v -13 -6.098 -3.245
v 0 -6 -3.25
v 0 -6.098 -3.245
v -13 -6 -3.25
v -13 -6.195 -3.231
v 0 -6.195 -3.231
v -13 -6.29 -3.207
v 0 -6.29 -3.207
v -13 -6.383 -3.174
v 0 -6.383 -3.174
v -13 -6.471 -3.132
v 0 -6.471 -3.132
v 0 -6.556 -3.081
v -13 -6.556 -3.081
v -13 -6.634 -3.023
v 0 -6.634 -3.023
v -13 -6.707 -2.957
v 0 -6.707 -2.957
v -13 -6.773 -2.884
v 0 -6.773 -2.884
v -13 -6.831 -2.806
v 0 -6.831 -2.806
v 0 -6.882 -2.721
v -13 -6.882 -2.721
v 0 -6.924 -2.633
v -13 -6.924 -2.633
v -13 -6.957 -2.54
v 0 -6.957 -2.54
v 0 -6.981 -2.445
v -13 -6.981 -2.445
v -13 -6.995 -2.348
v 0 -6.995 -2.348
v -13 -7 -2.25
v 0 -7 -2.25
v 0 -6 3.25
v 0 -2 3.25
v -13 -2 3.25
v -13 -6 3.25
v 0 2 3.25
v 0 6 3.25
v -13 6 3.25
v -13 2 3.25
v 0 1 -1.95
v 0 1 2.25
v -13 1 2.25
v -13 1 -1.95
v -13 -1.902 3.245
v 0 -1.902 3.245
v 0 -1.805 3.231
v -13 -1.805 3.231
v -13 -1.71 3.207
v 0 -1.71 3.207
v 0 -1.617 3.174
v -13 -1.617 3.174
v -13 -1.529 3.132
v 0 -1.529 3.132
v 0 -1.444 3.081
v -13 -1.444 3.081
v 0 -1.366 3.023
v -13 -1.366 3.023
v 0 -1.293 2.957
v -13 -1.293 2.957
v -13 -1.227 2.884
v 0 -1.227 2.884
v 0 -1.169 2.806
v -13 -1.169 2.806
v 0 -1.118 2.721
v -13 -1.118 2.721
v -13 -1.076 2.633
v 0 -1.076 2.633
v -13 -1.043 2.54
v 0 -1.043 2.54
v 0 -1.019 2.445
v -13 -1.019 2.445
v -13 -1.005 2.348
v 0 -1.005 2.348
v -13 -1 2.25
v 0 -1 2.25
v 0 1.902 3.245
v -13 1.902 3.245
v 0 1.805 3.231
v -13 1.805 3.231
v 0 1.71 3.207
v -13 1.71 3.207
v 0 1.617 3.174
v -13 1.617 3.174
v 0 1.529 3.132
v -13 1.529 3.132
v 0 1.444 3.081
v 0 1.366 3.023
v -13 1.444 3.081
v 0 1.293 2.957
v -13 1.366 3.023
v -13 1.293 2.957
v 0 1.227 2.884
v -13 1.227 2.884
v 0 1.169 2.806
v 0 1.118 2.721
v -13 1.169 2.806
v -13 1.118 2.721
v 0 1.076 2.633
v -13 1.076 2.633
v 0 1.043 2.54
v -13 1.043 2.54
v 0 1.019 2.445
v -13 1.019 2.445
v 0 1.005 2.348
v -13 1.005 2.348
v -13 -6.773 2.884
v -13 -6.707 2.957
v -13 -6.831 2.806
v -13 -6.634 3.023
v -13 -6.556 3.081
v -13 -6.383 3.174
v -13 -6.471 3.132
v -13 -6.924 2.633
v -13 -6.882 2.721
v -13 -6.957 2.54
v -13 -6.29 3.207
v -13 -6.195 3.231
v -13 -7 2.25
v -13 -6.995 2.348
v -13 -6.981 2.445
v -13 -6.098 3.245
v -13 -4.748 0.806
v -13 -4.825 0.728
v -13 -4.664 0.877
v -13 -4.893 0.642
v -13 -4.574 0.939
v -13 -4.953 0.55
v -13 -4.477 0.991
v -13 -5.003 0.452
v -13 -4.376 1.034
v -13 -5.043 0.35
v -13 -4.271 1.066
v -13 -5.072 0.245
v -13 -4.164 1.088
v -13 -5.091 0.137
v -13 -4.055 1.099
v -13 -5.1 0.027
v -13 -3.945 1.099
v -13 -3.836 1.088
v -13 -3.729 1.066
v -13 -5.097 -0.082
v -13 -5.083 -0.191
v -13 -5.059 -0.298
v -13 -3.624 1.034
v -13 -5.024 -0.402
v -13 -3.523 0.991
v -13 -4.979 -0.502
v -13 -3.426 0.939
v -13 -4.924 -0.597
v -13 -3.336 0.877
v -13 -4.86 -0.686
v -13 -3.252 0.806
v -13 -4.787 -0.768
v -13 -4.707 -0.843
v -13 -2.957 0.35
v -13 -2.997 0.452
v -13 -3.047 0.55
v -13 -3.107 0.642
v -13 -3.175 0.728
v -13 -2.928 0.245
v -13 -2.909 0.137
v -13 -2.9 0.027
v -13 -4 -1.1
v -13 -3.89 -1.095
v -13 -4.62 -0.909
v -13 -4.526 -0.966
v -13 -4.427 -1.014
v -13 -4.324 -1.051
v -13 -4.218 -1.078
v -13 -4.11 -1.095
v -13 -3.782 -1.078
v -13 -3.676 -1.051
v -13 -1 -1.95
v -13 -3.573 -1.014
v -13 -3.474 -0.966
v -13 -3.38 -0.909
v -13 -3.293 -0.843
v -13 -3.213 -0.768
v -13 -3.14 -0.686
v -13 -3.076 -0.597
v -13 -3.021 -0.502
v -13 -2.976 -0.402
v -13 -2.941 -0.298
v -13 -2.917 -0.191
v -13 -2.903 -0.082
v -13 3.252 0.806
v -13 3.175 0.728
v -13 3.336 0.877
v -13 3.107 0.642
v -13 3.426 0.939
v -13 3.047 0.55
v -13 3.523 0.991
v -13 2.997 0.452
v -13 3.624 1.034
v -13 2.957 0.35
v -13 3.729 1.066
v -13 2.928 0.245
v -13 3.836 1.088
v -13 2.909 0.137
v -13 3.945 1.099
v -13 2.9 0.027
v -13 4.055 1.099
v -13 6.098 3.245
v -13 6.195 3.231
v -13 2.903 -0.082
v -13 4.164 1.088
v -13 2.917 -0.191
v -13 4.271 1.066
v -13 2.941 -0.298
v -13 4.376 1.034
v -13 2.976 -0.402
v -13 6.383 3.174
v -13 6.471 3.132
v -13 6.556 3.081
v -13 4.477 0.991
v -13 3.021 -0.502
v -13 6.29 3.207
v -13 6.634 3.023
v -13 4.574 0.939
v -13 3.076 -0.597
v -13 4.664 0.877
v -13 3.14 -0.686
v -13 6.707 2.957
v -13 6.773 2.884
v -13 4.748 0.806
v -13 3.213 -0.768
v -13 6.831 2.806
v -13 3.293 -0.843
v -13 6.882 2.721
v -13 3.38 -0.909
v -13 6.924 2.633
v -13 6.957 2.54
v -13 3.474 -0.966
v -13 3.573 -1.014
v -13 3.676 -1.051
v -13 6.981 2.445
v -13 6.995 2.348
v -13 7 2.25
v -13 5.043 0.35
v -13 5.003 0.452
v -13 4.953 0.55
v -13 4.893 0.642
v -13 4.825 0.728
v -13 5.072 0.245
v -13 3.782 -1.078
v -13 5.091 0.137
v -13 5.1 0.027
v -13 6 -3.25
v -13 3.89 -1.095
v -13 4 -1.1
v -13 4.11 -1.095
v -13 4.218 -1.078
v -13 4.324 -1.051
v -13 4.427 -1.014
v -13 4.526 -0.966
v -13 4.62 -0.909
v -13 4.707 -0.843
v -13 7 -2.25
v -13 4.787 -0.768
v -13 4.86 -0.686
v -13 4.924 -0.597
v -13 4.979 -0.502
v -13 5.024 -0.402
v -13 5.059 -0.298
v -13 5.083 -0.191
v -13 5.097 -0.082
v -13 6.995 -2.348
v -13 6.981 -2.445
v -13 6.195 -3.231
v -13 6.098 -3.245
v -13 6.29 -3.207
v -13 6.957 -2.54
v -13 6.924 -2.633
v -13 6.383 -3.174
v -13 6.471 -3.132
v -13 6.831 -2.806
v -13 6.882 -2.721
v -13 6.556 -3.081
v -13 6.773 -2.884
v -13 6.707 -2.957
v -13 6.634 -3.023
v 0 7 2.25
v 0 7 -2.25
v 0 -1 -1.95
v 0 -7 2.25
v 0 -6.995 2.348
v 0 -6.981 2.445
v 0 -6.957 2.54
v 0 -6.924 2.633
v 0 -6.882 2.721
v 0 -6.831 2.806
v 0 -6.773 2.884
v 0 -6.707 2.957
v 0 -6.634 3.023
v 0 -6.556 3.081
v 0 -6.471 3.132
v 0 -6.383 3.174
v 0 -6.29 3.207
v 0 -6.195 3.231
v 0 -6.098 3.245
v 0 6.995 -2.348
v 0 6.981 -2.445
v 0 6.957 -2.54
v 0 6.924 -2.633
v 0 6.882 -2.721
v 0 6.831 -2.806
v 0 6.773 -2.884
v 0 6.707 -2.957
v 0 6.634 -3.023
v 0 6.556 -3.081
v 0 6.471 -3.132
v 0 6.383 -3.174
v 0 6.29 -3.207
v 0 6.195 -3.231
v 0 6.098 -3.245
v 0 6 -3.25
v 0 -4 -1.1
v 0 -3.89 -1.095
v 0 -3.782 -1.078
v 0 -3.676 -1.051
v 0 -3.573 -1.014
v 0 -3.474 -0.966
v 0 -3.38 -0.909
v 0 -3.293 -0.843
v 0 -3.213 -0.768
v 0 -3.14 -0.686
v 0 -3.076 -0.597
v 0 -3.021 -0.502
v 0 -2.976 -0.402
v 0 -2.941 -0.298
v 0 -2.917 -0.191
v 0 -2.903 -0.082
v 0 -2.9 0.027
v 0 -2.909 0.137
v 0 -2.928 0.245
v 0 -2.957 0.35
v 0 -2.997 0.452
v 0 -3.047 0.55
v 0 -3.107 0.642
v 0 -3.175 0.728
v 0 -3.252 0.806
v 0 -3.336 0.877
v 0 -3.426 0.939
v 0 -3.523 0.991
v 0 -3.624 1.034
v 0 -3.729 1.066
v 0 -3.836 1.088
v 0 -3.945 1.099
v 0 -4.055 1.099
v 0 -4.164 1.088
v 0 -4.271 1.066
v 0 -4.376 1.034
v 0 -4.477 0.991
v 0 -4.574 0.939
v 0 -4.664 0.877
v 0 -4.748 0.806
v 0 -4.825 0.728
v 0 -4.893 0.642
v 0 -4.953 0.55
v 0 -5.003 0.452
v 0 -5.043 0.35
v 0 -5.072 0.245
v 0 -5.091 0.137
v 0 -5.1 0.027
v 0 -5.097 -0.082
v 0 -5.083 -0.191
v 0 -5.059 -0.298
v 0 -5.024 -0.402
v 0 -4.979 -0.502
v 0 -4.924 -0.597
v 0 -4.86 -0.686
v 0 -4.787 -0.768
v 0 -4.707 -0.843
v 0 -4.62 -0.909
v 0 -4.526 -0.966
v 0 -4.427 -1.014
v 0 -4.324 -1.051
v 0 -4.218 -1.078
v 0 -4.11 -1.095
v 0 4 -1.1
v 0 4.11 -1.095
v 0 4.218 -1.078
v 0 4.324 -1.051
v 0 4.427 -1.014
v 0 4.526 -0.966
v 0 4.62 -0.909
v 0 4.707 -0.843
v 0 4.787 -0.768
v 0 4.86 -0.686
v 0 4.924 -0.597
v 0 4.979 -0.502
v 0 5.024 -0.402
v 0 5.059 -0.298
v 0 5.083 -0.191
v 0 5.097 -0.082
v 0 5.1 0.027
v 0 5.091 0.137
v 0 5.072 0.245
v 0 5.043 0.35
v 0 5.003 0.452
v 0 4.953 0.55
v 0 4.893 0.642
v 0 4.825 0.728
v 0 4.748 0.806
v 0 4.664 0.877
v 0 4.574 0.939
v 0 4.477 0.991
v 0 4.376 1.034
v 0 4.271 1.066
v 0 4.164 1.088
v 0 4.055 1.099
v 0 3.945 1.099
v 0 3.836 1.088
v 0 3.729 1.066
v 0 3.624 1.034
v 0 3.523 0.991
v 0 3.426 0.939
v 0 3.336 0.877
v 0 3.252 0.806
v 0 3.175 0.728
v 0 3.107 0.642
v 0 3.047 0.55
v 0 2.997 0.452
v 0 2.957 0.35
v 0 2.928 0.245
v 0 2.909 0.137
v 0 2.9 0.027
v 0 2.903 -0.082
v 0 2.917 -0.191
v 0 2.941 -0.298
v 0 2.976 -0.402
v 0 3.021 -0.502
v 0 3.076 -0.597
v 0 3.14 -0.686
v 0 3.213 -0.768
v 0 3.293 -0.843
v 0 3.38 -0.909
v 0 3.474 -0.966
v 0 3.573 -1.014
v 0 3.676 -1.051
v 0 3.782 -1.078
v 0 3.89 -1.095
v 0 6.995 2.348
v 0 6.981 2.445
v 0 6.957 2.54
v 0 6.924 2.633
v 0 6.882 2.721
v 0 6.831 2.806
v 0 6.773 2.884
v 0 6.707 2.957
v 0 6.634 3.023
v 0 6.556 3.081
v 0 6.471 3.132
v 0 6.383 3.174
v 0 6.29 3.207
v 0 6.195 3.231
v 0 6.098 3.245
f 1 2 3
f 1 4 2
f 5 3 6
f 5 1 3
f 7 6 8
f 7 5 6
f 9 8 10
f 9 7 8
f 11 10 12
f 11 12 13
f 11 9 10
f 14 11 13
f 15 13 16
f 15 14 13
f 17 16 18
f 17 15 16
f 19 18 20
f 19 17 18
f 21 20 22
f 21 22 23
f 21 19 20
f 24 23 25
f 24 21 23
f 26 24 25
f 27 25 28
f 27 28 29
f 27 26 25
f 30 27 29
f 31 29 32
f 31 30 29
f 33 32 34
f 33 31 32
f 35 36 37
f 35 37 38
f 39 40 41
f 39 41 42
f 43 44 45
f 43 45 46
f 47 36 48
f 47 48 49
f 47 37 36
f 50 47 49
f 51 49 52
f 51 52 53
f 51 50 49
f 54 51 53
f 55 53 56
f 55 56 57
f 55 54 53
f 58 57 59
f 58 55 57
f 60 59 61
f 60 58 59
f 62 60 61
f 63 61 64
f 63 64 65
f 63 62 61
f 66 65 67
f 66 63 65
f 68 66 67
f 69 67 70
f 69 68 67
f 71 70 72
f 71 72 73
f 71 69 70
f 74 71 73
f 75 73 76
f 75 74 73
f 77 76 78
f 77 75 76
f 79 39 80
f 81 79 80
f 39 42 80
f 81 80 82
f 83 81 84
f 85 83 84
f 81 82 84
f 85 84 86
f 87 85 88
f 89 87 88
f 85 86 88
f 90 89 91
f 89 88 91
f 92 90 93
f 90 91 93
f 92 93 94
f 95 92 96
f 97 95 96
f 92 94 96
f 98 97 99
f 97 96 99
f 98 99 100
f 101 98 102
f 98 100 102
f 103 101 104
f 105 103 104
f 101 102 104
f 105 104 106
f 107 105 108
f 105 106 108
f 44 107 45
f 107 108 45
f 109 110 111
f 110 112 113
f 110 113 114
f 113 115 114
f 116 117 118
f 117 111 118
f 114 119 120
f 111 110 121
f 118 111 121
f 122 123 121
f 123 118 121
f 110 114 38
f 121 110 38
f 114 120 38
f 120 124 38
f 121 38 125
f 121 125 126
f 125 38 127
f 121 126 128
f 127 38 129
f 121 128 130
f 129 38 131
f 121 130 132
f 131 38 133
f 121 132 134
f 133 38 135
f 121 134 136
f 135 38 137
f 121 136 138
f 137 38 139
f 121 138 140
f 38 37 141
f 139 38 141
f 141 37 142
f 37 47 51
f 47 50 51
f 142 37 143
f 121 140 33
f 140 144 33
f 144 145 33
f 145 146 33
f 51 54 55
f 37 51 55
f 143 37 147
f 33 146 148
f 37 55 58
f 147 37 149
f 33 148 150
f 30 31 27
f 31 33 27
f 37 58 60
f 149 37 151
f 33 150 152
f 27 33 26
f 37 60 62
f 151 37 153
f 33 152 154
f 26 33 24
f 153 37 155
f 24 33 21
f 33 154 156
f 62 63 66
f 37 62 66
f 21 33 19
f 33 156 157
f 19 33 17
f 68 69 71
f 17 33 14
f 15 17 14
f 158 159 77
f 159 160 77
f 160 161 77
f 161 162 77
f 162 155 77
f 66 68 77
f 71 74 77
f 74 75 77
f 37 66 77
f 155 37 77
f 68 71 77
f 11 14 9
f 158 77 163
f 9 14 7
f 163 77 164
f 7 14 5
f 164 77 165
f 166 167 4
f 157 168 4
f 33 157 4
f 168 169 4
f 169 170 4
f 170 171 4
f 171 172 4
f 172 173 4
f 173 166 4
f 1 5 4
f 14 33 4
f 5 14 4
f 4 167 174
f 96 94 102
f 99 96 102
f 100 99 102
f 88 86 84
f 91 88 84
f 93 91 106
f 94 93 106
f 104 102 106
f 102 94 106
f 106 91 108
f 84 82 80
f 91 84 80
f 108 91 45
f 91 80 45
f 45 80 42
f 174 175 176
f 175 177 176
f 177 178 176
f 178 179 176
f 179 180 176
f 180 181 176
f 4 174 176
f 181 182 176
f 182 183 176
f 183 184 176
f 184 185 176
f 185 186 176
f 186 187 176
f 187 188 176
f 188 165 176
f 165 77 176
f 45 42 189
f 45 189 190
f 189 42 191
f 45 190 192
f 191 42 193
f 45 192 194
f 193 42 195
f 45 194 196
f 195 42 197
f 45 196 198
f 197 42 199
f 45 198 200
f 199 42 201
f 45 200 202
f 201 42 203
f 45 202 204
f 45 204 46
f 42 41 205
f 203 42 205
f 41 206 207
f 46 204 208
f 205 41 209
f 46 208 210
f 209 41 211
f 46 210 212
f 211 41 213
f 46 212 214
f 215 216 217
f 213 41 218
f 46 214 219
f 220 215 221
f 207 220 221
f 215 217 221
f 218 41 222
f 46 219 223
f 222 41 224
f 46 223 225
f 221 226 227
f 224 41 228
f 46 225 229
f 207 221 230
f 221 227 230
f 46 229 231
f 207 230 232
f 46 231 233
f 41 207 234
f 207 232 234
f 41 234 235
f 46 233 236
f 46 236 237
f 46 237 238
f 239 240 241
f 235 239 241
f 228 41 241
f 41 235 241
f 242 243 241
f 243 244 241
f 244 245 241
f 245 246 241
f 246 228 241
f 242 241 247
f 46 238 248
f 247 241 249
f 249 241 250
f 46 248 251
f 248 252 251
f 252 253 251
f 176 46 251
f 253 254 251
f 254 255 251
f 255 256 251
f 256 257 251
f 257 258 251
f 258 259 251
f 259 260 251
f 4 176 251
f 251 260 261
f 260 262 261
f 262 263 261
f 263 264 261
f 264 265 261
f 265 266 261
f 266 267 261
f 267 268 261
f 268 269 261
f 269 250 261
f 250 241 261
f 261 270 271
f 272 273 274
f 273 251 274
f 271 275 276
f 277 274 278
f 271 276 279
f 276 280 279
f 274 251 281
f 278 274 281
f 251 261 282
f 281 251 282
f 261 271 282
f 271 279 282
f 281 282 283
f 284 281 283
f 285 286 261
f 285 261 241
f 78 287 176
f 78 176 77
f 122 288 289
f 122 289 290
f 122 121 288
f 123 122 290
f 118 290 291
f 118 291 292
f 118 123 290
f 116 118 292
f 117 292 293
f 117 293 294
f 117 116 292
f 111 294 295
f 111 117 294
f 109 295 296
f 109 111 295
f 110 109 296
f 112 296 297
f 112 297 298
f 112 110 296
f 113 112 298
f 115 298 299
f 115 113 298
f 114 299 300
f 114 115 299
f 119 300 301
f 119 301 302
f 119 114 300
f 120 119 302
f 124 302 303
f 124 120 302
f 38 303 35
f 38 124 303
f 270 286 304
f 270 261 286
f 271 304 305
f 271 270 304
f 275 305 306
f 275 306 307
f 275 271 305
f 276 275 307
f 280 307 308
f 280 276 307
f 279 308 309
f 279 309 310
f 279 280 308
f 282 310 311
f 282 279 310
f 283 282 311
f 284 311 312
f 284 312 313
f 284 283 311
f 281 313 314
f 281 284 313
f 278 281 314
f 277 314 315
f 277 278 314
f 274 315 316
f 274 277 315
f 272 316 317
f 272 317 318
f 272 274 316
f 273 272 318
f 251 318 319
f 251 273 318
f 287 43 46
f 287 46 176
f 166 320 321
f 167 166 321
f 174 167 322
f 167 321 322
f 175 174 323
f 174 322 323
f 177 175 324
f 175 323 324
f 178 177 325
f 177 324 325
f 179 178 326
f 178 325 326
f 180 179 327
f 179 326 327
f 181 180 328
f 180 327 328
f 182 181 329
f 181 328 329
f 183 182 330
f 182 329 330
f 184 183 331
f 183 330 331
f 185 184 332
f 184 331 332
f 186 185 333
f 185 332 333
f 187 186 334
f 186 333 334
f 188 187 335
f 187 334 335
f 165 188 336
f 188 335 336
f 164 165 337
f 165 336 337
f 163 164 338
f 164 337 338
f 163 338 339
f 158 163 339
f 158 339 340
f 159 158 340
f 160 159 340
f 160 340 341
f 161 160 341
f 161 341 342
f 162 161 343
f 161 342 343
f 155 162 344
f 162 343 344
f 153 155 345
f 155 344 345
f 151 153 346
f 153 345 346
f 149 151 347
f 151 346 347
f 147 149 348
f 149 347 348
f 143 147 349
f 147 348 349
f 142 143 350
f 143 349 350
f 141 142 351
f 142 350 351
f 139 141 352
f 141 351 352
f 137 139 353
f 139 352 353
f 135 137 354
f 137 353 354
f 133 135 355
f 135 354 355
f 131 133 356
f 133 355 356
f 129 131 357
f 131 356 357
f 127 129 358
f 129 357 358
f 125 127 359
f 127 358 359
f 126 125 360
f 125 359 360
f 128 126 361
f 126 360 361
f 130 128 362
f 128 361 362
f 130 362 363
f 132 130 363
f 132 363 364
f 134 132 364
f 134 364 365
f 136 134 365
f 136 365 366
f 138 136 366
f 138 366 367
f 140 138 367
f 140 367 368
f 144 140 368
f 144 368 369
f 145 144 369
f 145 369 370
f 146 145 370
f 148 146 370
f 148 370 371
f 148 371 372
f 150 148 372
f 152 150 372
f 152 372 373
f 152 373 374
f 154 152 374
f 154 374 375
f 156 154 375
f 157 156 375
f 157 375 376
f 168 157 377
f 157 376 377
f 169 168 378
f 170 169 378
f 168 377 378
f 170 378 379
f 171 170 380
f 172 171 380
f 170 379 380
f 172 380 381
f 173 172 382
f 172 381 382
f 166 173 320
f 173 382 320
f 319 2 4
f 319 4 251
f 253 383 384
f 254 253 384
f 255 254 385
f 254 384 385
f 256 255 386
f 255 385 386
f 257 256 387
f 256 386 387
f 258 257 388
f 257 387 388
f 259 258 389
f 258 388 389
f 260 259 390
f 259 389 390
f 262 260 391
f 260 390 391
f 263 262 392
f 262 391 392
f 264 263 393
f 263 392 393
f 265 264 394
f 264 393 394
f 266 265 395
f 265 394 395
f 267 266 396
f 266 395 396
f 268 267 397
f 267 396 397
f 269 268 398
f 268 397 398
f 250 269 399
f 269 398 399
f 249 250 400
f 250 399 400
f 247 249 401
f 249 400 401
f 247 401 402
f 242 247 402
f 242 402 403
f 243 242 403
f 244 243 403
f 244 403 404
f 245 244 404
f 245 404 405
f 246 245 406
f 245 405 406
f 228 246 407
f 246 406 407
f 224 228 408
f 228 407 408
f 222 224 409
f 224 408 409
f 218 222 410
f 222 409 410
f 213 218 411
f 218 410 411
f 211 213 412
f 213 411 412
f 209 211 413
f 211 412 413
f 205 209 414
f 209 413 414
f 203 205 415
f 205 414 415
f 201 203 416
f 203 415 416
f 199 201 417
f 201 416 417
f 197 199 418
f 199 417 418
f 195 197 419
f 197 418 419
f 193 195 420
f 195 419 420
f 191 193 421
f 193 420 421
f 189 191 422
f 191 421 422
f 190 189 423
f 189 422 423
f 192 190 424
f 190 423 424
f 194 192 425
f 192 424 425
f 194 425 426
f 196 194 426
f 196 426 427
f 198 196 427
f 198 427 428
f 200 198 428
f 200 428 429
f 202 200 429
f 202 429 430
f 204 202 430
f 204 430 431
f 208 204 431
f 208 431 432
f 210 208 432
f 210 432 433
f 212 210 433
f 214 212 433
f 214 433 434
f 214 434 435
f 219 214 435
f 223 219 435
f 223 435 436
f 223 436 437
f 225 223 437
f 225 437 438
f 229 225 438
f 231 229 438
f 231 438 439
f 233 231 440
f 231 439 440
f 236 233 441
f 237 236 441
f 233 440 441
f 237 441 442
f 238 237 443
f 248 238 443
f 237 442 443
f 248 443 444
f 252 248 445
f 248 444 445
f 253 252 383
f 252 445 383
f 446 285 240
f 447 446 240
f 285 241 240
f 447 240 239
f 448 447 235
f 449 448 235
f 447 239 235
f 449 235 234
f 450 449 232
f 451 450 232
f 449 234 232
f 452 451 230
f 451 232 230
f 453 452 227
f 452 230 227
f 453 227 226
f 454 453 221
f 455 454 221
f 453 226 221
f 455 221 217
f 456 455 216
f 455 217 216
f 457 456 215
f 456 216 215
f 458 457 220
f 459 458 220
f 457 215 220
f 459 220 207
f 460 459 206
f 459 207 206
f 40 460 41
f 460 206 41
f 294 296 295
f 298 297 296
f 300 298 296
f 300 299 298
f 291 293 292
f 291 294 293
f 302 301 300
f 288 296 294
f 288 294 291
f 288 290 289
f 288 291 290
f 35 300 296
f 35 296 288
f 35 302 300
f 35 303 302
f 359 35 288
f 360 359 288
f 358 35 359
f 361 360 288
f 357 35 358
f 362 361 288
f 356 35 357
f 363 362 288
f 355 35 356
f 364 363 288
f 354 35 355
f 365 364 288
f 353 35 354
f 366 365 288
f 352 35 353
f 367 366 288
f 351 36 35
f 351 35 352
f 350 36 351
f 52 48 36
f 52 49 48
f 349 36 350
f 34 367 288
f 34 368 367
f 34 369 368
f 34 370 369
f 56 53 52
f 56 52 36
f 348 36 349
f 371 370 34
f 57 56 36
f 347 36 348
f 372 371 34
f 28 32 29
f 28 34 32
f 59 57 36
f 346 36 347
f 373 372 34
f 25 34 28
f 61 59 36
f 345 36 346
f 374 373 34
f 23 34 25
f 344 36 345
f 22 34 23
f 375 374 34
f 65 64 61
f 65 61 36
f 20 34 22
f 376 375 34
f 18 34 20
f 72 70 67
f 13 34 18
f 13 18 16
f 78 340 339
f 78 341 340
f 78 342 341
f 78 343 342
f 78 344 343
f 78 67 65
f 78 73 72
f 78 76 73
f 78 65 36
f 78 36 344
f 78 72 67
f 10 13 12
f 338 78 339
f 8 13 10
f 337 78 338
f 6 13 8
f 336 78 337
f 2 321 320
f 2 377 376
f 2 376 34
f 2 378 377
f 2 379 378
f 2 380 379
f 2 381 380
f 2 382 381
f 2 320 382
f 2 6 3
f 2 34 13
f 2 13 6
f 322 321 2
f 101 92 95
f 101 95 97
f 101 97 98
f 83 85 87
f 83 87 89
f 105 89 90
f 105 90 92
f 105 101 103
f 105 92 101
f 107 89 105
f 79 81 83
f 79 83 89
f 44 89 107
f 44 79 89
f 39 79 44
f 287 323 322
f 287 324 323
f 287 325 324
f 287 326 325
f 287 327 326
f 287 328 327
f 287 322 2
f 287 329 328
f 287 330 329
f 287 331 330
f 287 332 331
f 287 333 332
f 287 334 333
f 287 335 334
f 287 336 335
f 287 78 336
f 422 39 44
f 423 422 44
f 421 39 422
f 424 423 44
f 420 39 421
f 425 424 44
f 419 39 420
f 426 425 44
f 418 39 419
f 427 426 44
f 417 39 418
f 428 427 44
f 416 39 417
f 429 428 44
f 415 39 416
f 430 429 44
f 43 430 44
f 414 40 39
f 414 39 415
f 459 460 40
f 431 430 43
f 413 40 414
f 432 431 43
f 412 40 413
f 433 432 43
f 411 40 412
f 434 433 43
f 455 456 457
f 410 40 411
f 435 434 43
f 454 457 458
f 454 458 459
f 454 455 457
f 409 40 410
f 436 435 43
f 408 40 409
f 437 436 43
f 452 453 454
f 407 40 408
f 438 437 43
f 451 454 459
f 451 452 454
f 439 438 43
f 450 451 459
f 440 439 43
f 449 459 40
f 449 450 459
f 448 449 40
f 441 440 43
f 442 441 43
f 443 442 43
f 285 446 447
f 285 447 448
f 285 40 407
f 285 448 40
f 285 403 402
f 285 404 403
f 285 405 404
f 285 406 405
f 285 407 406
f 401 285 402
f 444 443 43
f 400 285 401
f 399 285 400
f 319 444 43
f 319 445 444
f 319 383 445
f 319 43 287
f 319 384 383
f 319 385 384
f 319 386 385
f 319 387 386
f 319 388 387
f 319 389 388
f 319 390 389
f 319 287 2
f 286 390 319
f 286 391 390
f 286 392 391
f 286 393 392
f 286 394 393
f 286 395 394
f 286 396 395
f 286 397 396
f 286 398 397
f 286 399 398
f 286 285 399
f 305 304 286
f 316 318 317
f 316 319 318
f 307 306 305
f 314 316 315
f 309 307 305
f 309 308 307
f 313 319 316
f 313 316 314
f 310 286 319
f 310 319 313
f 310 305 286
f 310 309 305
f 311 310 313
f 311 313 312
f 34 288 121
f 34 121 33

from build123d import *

# Parameters (mm, degrees)
SKETCH_1_R      = 1.1
EXTRUDE_1_DEPTH = 13
FILLET_1_R      = 1


with BuildPart() as part:
    # 草图1 → 凸台-拉伸1 (new body)
    with BuildSketch(Plane(origin=(0, 0, 0), x_dir=(0, 0, -1), z_dir=(1, 0, 0))):
        Polygon((3.25, 7), (-3.25, 7), (-3.25, 1), (1.95, 1), (1.95, -1), (-3.25, -1), (-3.25, -7), (3.25, -7), align=None)
        with Locations((0, -4)):
            Circle(SKETCH_1_R, mode=Mode.SUBTRACT)
        with Locations((0, 4)):
            Circle(SKETCH_1_R, mode=Mode.SUBTRACT)
    extrude(amount=-EXTRUDE_1_DEPTH)

    # 圆角1
    fillet_1_edges = [part.edges().sort_by_distance(p)[0] for p in [
        (-6.5, 1, 3.25),
        (-6.5, 7, 3.25),
        (-6.5, 7, -3.25),
        (-6.5, -7, -3.25),
        (-6.5, -7, 3.25),
        (-6.5, -1, 3.25),
    ]]
    fillet(fillet_1_edges, radius=FILLET_1_R)


solid = part.part
